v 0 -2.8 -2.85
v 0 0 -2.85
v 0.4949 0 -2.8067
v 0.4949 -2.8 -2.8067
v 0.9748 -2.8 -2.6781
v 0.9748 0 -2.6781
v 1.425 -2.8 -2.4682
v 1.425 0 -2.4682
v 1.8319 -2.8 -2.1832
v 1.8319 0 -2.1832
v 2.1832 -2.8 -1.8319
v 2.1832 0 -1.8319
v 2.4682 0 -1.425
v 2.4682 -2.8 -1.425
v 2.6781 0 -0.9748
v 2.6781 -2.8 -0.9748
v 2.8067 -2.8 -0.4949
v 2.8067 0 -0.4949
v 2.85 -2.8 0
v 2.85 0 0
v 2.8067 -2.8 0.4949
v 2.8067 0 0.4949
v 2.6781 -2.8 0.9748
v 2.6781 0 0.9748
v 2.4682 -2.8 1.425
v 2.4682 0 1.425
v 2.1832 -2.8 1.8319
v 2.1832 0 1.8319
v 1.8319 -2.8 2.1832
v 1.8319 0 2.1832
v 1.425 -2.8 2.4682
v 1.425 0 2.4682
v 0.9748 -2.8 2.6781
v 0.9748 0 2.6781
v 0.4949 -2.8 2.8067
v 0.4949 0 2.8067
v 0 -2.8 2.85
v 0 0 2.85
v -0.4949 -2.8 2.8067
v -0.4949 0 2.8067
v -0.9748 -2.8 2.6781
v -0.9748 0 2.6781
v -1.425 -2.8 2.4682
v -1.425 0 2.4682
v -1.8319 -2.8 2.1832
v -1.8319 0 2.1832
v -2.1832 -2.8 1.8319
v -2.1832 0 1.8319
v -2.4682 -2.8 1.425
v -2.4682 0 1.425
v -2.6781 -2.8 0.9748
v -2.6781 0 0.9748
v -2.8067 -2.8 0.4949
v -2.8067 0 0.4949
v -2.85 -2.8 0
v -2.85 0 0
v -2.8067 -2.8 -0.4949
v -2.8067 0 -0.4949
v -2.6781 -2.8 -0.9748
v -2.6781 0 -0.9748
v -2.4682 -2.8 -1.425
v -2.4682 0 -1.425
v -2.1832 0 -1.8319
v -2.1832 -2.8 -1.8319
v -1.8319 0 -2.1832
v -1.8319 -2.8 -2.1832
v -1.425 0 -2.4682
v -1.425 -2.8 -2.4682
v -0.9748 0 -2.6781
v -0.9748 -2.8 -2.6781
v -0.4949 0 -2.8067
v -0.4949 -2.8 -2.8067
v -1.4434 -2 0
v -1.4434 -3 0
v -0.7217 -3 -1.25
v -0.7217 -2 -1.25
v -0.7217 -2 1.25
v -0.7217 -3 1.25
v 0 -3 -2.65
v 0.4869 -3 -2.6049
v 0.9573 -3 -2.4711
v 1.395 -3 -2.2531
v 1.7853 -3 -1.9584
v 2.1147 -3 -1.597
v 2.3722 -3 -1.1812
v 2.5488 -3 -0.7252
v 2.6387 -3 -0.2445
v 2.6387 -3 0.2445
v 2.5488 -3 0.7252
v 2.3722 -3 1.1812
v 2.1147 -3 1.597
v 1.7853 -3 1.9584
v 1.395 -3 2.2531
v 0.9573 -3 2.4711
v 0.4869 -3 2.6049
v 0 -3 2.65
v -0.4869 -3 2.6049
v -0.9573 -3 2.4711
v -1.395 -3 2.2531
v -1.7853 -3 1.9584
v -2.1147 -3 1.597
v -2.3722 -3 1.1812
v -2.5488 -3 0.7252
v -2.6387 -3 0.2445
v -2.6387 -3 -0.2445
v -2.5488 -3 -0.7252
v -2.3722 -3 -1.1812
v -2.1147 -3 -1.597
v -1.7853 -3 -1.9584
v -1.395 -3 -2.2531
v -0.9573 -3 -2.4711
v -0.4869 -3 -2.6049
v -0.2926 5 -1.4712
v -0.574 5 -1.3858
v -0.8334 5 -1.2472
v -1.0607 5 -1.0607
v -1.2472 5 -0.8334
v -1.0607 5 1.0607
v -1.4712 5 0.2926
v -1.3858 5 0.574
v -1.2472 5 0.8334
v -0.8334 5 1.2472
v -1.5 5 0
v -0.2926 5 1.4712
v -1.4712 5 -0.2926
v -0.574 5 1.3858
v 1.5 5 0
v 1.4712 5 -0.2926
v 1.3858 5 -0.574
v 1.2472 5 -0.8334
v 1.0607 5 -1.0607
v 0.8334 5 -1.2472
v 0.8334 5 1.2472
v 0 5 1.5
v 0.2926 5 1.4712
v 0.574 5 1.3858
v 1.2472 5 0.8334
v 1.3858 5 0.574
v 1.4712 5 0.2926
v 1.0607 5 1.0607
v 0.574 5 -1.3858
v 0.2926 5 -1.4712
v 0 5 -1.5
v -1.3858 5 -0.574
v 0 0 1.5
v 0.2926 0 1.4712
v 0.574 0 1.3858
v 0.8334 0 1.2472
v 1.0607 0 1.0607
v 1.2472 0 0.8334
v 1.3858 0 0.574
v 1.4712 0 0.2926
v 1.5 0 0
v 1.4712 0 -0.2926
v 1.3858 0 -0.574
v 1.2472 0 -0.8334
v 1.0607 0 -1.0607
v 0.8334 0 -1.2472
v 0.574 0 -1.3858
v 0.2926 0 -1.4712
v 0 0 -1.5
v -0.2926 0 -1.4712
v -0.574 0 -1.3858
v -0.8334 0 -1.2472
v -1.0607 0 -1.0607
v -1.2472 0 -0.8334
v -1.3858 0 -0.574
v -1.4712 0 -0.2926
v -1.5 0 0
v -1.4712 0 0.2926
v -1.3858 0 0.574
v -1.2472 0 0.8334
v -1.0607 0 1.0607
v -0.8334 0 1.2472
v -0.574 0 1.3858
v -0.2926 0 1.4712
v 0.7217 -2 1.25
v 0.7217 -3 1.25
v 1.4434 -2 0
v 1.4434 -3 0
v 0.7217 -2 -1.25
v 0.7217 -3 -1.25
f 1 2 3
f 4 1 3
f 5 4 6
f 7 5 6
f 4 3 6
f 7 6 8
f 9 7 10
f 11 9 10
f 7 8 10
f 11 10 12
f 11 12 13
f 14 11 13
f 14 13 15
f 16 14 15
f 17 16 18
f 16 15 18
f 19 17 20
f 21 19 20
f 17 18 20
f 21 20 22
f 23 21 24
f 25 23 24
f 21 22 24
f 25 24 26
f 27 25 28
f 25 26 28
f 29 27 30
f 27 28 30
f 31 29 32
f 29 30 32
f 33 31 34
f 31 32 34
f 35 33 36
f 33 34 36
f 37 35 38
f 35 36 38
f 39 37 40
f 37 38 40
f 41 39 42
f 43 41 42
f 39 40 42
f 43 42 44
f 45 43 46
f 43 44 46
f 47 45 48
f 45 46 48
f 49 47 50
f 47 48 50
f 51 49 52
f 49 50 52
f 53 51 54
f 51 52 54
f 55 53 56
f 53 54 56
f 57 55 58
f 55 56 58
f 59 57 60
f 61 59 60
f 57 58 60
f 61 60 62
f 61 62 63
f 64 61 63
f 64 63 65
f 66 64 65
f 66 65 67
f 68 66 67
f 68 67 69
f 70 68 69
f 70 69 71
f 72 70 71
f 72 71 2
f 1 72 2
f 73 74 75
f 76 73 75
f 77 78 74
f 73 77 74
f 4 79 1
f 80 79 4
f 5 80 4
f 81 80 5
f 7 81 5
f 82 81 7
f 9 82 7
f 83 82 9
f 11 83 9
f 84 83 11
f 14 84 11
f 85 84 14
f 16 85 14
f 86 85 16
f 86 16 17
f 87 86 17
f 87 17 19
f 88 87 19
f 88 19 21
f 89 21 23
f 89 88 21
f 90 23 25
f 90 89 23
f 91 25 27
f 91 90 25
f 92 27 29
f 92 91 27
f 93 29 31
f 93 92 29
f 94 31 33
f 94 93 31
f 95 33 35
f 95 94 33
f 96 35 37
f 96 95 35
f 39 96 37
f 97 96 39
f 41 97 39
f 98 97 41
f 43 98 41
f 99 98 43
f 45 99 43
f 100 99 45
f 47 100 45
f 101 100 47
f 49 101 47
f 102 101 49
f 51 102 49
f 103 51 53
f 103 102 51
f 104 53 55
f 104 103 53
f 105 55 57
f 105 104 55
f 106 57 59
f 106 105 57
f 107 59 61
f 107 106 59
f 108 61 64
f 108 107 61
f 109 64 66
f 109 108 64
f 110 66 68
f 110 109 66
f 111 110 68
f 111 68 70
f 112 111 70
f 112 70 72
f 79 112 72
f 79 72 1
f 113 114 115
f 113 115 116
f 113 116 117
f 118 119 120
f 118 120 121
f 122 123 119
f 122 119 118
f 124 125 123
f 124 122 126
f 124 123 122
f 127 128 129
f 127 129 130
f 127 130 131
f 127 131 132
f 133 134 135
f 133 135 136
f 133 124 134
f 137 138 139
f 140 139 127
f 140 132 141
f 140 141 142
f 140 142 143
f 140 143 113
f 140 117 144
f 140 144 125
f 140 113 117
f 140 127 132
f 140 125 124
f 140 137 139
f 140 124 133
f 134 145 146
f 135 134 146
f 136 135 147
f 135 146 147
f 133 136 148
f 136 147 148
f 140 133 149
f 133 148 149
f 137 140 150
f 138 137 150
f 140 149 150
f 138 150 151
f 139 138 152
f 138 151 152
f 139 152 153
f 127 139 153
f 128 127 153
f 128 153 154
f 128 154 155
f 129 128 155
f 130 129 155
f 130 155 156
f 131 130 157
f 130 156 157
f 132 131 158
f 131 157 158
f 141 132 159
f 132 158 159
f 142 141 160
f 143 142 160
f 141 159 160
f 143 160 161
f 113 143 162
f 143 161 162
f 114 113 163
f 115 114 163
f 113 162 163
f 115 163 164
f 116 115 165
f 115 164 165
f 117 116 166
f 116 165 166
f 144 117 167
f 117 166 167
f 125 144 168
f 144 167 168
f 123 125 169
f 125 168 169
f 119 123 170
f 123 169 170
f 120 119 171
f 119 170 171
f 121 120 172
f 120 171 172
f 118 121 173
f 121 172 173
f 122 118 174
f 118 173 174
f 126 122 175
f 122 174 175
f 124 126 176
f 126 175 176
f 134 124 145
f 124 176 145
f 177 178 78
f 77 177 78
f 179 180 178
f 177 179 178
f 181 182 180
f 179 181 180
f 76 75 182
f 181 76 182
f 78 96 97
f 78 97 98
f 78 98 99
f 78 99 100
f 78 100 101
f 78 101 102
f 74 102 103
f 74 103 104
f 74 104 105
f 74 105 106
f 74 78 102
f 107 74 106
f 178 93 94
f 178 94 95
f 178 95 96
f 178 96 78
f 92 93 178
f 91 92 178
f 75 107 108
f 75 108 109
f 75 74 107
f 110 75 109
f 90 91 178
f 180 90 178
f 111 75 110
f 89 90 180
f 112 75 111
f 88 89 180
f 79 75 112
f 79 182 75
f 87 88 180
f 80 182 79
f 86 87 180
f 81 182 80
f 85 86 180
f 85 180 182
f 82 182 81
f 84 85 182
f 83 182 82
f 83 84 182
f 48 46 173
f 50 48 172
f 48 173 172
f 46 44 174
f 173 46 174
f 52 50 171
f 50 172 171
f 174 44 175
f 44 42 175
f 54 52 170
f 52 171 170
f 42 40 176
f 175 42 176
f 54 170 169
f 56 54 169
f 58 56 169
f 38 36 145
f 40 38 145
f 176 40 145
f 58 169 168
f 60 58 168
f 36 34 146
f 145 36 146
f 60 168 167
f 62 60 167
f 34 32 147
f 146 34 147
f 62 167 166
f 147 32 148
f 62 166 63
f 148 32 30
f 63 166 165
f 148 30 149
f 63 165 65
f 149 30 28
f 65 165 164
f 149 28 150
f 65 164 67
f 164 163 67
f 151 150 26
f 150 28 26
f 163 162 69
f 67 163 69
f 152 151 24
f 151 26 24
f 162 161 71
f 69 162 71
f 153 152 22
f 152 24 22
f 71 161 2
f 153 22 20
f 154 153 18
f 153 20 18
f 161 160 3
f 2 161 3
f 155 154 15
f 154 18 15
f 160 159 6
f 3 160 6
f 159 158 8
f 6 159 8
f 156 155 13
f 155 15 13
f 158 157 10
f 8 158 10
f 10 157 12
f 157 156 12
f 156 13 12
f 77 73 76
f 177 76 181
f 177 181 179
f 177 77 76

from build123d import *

# Parameters (mm, degrees)
SKETCH_1_R          = 1.5
EXTRUDE_1_DEPTH     = 5
SKETCH_2_R          = 2.85
EXTRUDE_2_DEPTH     = 3
CUT_EXTRUDE_1_DEPTH = 1
CHAMFER_1_SIZE      = 0.2


with BuildPart() as part:
    # 草图1 → 凸台-拉伸1 (new body)
    with BuildSketch(Plane(origin=(0, 0, 0), x_dir=(1, 0, 0), z_dir=(0, 1, 0))):
        with Locations(Location((0, 0, 0), (0, 0, 270))):
            Circle(SKETCH_1_R)
    extrude(amount=EXTRUDE_1_DEPTH)

    # 草图2 → 凸台-拉伸2 (add)
    with BuildSketch(Plane.XZ):
        with Locations(Location((0, 0, 0), (0, 0, 270))):
            Circle(SKETCH_2_R)
    extrude(amount=EXTRUDE_2_DEPTH)

    # 草图3 → 切除-拉伸1 (cut)
    with BuildSketch(Plane.XZ.offset(3)):
        Polygon((1.443375673, 0), (0.721687836, 1.25), (-0.721687836, 1.25), (-1.443375673, 0), (-0.721687836, -1.25), (0.721687836, -1.25), align=None)
    extrude(amount=-CUT_EXTRUDE_1_DEPTH, mode=Mode.SUBTRACT)

    # 倒角1
    chamfer_1_edges = [part.edges().sort_by_distance(p)[0] for p in [
        (0, -3, 2.85),
    ]]
    chamfer(chamfer_1_edges, length=CHAMFER_1_SIZE)


solid = part.part
